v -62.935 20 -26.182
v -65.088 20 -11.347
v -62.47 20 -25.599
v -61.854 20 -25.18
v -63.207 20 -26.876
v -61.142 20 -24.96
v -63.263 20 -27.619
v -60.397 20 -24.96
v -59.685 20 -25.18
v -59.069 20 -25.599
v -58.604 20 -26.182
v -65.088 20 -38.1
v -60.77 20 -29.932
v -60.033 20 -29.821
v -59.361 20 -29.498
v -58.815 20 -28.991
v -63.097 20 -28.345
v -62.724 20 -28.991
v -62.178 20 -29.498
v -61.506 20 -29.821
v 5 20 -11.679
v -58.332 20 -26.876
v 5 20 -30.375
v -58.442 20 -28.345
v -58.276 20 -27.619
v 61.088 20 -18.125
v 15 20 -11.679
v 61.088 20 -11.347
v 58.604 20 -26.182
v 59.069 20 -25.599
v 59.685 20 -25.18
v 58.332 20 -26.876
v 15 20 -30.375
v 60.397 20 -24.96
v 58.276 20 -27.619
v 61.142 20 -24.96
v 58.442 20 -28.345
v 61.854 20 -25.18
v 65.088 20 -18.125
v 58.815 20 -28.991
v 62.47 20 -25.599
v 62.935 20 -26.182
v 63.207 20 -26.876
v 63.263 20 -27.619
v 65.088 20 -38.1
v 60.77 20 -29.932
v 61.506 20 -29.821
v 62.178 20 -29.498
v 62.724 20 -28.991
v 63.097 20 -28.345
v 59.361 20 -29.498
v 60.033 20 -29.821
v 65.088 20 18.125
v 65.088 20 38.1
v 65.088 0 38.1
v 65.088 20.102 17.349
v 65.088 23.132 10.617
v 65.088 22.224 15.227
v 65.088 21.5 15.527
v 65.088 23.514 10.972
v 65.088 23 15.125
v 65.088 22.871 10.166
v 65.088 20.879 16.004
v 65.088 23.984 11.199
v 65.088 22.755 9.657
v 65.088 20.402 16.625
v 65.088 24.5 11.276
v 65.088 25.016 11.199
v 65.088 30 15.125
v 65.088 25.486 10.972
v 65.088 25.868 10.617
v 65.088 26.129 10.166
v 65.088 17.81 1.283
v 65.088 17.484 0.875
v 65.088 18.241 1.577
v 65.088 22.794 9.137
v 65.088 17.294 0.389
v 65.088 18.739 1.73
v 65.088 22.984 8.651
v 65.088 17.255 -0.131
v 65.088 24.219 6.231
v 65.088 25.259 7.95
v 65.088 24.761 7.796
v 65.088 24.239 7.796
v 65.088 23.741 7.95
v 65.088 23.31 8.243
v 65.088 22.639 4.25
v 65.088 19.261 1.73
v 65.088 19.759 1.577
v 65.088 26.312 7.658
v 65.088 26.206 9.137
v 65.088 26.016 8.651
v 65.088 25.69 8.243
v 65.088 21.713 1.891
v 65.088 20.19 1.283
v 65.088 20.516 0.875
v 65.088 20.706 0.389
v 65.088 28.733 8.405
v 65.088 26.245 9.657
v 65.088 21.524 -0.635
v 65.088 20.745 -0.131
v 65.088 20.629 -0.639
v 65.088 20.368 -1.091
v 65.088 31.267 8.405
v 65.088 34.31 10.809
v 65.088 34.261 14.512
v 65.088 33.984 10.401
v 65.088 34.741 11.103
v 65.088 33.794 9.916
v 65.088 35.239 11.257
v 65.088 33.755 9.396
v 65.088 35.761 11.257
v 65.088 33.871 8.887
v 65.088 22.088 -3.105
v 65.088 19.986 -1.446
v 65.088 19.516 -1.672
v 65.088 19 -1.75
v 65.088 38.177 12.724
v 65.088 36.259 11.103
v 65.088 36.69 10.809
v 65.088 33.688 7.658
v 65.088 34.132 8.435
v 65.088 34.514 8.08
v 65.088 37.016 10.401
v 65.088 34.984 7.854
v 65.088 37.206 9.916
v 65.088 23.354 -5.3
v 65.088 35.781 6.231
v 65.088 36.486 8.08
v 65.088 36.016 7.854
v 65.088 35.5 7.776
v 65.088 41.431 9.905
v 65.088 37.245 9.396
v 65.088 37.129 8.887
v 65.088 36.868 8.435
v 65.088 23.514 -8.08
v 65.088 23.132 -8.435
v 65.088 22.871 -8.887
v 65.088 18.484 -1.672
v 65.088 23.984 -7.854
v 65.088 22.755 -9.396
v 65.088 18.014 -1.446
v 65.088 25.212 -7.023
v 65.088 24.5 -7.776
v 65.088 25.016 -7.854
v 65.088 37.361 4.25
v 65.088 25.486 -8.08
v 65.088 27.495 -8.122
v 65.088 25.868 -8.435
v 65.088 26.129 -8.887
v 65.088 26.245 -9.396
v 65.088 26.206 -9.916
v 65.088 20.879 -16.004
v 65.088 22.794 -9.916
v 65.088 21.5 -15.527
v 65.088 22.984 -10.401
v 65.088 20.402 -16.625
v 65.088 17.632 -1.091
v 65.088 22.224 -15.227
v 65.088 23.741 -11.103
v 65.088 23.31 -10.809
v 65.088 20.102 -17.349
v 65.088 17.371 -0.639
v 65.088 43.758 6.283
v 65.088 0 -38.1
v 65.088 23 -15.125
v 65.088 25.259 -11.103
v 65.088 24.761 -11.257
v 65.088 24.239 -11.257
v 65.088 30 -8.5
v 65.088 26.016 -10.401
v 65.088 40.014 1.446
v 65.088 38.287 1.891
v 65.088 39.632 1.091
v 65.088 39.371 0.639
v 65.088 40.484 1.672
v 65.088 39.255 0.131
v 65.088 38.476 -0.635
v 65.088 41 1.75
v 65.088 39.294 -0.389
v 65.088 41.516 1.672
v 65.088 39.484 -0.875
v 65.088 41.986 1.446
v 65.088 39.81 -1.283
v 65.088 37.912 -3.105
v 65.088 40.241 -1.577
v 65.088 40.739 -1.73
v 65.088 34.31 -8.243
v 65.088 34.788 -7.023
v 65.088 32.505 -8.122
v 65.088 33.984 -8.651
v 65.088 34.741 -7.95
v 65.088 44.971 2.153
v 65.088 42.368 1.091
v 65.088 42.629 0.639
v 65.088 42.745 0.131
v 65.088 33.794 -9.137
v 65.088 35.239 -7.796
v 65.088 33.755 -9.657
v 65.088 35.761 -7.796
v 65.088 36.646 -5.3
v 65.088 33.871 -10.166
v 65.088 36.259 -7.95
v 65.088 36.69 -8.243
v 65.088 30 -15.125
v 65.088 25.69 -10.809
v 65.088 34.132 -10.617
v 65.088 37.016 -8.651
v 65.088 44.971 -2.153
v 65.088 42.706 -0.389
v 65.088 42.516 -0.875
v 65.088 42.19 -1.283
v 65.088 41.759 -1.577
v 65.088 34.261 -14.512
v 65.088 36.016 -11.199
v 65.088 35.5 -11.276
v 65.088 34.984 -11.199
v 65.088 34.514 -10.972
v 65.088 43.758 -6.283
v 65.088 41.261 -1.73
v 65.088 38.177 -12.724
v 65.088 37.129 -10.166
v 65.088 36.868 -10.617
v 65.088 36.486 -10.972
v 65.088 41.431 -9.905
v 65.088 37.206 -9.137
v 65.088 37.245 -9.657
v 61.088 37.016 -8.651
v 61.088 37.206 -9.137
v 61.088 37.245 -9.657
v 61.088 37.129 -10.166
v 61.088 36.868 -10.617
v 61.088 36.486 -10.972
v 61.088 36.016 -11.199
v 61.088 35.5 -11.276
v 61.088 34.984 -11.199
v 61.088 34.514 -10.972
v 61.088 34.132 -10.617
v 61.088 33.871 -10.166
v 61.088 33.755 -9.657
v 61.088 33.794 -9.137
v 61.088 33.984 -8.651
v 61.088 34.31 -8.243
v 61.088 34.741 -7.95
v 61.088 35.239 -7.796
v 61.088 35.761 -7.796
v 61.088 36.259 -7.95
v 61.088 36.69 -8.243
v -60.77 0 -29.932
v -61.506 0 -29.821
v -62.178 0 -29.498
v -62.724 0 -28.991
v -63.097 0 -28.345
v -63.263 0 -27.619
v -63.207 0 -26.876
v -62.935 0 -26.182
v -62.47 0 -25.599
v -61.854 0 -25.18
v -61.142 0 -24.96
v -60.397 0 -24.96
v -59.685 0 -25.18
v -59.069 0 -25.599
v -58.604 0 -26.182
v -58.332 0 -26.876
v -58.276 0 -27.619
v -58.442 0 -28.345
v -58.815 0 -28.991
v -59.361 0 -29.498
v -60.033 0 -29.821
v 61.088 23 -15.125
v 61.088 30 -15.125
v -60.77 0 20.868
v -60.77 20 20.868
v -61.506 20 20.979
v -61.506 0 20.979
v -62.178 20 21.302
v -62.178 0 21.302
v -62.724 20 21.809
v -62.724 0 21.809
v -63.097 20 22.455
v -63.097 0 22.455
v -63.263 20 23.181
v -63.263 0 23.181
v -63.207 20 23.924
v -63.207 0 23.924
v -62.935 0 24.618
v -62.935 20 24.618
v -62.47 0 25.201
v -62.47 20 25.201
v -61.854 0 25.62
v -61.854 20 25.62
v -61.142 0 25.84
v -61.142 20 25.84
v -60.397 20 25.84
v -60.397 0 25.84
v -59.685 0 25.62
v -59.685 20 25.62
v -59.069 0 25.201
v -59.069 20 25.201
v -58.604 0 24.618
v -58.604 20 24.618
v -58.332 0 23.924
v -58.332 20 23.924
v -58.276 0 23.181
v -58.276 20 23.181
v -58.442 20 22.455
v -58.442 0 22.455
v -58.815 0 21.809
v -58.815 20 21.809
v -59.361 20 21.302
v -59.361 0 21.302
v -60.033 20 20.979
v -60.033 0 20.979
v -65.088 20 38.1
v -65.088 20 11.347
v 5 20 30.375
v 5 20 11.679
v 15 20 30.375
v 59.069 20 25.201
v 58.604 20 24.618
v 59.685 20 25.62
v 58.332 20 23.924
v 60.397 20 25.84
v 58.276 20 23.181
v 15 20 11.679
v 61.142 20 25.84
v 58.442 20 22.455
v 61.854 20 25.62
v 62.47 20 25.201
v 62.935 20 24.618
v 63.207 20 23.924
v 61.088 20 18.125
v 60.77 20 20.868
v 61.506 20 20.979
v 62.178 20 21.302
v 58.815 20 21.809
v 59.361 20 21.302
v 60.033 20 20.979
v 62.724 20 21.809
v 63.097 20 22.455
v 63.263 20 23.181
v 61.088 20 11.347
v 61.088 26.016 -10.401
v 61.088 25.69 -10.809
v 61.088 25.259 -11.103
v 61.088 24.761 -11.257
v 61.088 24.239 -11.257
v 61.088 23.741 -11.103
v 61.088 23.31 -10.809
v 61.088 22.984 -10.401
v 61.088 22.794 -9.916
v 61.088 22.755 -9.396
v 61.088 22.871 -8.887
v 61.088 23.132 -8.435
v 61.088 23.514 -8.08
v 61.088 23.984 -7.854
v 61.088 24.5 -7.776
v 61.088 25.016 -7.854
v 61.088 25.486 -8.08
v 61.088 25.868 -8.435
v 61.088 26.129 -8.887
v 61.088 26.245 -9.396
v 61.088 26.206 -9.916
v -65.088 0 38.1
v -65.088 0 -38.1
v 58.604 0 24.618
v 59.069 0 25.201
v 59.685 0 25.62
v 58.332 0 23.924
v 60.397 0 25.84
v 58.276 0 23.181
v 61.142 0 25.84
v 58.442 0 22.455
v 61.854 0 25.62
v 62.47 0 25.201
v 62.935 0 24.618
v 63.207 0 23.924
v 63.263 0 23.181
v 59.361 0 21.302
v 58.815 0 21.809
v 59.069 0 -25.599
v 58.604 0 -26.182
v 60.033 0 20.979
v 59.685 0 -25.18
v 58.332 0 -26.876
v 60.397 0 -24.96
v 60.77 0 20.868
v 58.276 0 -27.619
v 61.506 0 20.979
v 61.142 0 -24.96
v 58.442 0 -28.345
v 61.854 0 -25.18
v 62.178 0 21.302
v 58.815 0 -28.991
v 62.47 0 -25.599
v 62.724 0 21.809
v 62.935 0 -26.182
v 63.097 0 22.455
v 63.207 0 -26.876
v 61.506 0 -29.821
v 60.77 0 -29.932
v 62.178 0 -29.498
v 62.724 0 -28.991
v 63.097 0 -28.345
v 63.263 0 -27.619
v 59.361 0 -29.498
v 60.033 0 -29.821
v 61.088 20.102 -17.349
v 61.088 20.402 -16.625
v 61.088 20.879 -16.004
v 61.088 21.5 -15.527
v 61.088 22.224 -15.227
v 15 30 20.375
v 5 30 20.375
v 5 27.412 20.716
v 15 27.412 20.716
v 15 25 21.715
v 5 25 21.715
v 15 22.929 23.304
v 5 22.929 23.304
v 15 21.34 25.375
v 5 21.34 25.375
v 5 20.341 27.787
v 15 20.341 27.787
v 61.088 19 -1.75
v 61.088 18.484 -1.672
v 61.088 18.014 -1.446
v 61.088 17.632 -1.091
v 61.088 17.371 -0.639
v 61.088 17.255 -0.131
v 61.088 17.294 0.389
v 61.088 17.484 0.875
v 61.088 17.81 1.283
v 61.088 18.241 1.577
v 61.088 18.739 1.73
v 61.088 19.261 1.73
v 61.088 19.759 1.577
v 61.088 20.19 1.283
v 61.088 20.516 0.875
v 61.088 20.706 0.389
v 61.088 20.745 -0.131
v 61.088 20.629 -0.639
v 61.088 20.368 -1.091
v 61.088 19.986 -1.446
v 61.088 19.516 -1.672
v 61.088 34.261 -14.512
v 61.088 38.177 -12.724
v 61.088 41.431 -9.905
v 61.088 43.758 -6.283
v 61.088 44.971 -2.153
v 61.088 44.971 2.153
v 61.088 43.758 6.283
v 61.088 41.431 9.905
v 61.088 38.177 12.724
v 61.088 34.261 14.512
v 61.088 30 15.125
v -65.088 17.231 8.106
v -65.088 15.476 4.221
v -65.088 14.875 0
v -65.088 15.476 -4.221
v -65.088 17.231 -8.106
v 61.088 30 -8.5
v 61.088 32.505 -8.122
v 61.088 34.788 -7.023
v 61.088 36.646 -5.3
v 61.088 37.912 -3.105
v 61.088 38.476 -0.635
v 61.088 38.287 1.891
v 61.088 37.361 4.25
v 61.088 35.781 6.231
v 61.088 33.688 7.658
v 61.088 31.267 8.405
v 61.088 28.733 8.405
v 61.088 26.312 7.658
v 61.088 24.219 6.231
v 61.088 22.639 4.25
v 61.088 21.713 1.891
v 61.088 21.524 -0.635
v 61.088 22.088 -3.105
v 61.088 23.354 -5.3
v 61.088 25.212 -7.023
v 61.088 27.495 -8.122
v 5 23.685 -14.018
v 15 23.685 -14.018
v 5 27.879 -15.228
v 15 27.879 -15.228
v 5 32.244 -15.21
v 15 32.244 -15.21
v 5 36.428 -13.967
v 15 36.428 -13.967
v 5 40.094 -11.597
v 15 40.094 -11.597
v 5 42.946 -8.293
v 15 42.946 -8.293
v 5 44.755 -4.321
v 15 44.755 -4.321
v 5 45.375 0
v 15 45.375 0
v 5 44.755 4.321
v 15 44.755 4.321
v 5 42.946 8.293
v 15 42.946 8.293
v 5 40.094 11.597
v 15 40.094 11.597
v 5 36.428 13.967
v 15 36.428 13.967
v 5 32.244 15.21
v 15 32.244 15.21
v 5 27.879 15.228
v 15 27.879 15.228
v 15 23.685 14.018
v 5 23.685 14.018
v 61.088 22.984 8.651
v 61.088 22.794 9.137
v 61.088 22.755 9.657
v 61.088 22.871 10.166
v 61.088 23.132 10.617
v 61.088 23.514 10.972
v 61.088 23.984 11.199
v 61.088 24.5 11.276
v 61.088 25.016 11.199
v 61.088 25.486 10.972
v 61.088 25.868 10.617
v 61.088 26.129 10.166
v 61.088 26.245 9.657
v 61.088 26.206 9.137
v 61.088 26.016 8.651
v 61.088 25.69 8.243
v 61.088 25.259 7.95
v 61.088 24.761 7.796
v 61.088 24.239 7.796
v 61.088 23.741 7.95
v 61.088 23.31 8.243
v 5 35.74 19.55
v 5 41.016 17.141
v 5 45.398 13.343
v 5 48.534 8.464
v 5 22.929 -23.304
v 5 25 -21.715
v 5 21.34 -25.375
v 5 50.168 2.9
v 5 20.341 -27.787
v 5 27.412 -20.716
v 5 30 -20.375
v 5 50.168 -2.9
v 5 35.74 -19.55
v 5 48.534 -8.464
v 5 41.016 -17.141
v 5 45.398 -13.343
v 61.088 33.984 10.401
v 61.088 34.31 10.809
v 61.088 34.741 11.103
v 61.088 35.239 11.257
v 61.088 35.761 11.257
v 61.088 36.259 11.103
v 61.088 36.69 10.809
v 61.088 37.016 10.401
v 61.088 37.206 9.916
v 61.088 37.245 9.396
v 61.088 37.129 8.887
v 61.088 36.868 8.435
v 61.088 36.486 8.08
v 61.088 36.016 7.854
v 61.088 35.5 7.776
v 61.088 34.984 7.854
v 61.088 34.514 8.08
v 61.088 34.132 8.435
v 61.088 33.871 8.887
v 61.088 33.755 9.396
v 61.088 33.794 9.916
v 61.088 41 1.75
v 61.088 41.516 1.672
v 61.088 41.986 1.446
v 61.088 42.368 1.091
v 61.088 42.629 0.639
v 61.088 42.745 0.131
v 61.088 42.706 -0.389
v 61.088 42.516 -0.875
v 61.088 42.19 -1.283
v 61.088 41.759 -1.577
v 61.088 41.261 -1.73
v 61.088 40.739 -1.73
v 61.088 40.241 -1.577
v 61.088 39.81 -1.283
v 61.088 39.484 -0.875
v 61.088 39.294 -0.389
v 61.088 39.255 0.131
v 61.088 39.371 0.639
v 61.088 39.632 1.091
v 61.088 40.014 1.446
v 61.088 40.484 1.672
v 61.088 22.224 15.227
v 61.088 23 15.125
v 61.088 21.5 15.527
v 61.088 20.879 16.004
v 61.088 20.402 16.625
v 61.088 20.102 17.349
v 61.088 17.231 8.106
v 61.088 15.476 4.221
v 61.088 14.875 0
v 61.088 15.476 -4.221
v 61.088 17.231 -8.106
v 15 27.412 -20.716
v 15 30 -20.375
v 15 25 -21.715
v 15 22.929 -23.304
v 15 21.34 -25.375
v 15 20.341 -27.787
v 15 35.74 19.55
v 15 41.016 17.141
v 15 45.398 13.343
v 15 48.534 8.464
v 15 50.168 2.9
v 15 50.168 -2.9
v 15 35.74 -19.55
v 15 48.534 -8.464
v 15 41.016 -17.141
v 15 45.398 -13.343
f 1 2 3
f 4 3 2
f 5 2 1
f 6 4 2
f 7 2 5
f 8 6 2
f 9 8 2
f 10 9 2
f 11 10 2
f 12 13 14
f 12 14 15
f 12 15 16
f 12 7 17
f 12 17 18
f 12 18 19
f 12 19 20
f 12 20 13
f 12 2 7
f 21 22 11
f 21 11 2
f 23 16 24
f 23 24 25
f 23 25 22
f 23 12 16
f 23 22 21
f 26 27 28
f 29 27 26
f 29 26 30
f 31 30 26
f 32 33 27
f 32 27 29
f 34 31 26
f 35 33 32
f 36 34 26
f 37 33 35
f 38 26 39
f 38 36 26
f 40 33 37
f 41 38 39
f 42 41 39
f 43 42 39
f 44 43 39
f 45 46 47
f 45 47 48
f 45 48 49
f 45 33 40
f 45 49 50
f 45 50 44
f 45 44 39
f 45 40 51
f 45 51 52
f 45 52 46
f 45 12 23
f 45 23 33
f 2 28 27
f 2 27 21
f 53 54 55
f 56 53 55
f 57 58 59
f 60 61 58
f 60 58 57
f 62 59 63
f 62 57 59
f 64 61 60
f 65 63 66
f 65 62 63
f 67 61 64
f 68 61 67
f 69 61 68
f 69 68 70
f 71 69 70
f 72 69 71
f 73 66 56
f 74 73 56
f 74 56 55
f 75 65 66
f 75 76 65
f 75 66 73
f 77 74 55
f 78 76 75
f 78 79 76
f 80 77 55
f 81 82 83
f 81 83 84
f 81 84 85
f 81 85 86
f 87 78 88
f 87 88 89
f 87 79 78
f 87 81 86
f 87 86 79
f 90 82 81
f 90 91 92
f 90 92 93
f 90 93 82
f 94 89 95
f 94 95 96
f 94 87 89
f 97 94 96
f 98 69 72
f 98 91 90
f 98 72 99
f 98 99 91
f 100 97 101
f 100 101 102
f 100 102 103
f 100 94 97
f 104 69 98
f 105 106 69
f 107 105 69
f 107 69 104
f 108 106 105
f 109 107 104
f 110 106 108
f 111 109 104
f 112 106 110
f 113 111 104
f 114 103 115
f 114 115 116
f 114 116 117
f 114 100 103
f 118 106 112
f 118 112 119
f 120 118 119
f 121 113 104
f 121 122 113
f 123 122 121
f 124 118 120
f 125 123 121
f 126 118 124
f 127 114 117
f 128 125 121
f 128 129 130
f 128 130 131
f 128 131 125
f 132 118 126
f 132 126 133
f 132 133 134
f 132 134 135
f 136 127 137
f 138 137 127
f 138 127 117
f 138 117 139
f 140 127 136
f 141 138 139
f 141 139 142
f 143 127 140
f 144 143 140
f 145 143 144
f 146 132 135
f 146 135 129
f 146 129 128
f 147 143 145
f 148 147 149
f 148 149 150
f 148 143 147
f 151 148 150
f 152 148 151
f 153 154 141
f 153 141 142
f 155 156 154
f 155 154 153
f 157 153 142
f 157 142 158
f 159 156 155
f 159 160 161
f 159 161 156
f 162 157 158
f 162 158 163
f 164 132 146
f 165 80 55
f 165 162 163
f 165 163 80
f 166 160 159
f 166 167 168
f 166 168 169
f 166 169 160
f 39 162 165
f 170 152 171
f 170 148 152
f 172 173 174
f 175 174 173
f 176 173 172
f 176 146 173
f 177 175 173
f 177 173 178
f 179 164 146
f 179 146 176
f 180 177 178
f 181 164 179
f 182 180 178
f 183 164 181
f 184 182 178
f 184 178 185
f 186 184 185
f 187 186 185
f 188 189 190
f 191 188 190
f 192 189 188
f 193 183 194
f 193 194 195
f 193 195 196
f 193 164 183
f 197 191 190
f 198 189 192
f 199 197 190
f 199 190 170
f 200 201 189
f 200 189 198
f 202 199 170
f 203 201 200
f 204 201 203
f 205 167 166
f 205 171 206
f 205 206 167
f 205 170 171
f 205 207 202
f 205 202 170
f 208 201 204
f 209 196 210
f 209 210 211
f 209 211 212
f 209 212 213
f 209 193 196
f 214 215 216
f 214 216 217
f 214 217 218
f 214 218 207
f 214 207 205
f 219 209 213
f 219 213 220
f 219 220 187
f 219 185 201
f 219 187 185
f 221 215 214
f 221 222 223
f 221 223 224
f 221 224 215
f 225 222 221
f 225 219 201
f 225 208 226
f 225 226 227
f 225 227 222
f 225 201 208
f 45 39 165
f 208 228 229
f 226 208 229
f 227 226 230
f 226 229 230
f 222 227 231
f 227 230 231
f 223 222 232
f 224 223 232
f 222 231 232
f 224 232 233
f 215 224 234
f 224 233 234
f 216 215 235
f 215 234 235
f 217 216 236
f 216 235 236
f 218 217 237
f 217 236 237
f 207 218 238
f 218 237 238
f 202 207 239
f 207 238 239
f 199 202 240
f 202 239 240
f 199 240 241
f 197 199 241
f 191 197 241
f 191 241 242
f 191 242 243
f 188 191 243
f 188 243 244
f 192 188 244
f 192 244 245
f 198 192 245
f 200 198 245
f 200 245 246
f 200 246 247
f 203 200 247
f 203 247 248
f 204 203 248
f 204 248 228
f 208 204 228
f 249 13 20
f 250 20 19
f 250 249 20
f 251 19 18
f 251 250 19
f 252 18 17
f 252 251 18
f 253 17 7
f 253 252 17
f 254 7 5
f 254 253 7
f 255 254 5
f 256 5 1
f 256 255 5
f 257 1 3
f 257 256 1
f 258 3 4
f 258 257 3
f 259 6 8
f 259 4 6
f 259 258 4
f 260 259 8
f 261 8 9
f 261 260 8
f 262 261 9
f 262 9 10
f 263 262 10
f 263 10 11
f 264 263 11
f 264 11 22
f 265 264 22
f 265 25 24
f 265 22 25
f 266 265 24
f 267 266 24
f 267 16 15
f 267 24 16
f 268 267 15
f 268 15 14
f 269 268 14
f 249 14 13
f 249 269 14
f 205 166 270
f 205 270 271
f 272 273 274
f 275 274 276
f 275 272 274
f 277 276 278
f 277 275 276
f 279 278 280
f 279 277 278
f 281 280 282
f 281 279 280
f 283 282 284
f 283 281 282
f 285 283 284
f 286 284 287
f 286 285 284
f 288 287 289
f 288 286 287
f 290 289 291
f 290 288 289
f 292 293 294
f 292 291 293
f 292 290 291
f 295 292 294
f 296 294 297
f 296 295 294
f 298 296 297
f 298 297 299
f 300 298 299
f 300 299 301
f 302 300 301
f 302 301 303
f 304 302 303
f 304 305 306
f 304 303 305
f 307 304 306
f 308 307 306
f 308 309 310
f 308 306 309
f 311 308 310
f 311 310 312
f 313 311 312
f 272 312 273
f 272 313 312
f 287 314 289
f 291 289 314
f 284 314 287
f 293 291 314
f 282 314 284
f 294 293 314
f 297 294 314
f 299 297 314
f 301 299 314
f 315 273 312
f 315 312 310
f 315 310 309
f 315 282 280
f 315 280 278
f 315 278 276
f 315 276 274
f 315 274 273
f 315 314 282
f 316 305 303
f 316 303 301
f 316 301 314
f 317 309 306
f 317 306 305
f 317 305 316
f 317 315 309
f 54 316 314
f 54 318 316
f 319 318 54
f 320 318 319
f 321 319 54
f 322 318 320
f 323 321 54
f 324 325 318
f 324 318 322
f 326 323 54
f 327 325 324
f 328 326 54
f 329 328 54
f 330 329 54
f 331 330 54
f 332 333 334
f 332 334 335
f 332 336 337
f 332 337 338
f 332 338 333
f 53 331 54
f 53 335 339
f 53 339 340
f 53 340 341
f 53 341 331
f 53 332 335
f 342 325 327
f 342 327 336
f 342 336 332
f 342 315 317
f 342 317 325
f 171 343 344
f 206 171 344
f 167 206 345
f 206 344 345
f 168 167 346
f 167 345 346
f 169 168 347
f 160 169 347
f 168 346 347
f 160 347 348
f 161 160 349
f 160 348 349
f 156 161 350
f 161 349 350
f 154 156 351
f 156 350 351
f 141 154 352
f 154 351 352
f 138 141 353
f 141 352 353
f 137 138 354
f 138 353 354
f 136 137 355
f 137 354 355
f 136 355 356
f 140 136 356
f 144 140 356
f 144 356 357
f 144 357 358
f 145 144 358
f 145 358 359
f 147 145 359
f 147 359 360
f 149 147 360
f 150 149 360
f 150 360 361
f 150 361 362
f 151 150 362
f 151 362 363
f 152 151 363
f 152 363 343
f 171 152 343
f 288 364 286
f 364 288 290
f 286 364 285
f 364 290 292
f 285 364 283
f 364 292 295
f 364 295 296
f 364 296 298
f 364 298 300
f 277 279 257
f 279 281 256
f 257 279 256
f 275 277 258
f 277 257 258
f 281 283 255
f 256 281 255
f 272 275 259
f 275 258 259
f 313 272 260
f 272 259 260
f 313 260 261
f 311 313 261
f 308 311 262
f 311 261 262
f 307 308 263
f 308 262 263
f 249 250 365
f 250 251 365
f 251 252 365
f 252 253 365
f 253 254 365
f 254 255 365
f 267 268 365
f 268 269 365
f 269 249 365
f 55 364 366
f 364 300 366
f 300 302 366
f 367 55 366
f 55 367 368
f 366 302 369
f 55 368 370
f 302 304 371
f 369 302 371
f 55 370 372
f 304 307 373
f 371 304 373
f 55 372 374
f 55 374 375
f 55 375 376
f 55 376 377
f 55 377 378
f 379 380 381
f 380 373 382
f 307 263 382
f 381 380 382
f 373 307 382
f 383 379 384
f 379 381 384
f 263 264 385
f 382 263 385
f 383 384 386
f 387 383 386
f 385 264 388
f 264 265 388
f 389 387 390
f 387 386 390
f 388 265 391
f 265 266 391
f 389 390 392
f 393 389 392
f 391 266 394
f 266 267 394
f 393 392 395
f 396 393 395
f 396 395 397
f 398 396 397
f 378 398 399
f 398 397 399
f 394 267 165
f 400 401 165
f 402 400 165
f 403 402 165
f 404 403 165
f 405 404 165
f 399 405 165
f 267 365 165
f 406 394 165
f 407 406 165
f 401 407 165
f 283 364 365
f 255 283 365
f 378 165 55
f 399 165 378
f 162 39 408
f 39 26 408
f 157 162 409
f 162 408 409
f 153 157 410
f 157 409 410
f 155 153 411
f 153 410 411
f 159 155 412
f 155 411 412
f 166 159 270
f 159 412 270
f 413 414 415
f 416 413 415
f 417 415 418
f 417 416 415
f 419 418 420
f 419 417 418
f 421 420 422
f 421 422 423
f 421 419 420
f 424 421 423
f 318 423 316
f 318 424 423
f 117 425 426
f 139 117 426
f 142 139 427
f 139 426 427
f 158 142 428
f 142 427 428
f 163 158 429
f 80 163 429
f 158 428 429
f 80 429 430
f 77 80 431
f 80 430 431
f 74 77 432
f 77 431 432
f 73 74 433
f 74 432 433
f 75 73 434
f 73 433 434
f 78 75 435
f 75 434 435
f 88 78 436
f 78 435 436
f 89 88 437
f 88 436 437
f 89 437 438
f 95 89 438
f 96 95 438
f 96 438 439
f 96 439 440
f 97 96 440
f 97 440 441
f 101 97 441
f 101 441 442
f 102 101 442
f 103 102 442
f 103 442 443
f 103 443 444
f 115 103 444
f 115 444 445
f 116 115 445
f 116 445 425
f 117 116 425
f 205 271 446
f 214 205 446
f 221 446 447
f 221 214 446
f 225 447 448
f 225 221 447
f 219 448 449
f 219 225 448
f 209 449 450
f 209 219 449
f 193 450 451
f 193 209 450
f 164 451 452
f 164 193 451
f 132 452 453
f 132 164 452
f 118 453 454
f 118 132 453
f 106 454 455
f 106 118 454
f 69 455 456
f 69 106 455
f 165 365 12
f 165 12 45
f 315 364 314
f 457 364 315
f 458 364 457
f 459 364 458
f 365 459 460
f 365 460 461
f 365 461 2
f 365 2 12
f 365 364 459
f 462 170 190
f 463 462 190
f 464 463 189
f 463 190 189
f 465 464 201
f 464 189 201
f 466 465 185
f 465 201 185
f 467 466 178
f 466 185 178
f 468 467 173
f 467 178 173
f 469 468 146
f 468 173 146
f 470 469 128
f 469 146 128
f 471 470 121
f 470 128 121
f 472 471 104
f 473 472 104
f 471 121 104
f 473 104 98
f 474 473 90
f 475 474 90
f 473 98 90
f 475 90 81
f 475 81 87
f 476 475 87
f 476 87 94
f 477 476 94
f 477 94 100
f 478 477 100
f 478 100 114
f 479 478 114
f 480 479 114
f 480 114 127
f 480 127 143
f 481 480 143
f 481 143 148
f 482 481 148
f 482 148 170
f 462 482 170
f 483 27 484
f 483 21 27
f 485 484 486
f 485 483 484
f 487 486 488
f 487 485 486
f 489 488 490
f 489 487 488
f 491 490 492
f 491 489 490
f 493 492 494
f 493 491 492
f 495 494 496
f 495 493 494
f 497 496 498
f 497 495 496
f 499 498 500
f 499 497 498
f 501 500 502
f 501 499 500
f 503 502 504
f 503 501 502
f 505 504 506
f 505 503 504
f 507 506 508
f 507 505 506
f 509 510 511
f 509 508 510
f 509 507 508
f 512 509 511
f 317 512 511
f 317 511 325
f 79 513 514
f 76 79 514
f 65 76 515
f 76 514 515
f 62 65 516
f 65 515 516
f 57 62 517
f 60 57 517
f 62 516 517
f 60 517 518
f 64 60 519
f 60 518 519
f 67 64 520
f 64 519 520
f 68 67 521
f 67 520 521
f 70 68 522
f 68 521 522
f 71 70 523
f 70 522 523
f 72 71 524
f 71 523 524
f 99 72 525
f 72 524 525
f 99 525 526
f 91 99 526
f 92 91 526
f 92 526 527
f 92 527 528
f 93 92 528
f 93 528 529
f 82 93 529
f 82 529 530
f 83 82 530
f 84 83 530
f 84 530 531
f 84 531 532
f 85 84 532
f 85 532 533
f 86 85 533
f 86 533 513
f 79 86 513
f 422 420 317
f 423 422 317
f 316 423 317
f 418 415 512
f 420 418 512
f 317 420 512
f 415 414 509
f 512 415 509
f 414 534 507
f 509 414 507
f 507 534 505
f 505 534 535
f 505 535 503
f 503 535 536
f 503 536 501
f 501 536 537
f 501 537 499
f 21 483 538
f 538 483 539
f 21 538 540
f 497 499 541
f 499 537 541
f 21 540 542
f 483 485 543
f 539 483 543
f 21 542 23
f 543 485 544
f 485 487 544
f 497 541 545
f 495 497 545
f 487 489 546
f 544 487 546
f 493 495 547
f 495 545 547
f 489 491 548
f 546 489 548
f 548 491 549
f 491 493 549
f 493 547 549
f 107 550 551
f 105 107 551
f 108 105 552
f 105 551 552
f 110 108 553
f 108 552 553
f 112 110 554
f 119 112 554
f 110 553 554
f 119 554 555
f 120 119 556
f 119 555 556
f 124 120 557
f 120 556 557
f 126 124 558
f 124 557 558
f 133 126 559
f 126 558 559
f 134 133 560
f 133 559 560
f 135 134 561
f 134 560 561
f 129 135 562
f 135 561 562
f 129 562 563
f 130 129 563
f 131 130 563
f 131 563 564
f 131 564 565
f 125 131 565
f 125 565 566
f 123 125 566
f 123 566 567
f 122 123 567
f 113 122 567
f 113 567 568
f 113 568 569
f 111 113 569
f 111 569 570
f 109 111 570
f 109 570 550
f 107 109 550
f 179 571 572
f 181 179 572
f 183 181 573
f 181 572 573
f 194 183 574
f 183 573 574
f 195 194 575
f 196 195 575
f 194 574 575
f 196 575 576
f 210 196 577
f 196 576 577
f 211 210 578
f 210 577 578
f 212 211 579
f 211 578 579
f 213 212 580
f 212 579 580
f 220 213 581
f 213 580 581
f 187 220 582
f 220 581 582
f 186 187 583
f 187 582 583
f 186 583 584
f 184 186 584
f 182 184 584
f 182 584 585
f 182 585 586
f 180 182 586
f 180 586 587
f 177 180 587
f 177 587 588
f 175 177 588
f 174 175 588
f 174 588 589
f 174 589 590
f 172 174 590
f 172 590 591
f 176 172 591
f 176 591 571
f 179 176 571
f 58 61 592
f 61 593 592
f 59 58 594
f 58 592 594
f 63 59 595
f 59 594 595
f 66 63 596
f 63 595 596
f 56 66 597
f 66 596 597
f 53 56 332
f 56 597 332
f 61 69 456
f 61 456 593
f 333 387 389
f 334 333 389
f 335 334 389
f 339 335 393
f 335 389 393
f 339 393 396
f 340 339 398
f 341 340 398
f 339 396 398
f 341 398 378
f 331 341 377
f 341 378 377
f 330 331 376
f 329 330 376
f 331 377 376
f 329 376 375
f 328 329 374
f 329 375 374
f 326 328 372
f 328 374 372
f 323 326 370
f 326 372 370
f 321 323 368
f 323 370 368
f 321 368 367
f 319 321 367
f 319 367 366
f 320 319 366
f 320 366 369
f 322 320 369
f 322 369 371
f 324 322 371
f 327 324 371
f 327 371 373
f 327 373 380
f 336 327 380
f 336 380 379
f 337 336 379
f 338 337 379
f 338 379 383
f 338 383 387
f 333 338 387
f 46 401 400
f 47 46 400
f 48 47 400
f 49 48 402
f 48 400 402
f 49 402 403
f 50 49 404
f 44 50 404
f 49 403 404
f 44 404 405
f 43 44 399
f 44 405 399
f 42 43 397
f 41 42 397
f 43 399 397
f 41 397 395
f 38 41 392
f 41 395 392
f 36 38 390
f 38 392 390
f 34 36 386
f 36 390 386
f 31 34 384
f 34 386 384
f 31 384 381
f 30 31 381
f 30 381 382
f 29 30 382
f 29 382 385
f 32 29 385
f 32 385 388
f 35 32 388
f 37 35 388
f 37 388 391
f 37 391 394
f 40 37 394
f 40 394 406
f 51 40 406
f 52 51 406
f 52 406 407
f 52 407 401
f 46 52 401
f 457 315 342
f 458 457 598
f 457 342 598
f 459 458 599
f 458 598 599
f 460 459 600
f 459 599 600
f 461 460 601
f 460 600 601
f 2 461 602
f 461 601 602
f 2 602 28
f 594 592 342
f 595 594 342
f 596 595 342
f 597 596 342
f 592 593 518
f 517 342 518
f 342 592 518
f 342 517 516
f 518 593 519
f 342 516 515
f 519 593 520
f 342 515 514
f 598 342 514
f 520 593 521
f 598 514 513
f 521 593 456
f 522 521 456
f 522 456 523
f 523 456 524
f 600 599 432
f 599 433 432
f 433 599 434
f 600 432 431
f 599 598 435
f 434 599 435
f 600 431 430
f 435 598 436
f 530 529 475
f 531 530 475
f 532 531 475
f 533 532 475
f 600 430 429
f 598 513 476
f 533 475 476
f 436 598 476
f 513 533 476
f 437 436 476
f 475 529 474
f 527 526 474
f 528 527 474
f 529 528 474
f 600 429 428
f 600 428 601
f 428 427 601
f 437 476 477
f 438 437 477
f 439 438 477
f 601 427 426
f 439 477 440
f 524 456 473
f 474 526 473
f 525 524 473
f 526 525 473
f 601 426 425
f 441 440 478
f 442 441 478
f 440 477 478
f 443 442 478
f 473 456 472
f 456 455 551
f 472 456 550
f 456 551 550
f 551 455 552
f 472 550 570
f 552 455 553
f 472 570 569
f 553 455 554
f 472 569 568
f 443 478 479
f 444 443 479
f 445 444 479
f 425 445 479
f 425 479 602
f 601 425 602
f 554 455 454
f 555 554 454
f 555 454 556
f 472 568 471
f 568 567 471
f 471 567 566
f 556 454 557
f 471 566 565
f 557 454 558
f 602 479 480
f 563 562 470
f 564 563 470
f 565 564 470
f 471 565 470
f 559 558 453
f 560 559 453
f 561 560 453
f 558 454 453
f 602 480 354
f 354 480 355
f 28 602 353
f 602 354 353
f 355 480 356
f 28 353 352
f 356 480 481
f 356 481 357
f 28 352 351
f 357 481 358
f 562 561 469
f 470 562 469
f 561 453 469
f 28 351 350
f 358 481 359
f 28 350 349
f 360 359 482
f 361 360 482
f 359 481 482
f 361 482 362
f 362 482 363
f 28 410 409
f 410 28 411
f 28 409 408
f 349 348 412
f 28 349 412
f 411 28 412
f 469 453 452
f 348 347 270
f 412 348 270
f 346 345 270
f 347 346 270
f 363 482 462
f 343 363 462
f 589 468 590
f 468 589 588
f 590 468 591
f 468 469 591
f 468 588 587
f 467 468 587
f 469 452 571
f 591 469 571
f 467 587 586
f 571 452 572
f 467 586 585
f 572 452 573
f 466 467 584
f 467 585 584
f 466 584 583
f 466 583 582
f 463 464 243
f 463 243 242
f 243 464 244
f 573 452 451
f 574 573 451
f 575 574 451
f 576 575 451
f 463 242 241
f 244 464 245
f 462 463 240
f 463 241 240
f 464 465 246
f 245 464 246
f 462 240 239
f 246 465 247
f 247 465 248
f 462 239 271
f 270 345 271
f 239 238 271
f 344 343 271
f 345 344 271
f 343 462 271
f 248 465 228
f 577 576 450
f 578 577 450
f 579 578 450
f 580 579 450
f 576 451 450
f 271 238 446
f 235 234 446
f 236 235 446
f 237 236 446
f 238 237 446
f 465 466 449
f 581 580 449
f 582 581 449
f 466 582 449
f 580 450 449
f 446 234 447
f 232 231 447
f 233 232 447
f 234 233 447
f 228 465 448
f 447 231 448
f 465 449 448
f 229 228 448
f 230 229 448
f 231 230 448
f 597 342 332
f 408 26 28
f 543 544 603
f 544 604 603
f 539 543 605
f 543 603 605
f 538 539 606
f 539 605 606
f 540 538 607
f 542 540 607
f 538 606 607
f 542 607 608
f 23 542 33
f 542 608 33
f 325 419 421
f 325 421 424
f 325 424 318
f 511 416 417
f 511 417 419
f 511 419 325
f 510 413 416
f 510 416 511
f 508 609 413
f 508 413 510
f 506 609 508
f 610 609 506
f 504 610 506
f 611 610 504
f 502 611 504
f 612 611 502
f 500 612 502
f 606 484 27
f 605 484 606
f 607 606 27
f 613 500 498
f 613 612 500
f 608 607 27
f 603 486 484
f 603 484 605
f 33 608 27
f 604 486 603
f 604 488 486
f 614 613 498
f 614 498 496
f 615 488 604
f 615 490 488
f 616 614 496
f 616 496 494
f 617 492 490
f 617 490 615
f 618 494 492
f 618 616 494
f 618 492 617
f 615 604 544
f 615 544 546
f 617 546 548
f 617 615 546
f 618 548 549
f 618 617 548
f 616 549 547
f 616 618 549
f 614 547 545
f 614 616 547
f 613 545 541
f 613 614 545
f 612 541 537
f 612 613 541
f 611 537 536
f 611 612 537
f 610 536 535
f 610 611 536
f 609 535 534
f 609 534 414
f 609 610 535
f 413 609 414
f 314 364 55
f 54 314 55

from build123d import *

# Parameters (mm, degrees)
SKETCH1_W           = 130.175
SKETCH1_H           = 76.2
BOSS_EXTRUDE1_DEPTH = 20
SKETCH2_R           = 15.125
CUT_EXTRUDE1_DEPTH  = 138.102664544
SKETCH3_R           = 15.125
BOSS_EXTRUDE2_DEPTH = 4
SKETCH4_R           = 1.75
CUT_EXTRUDE2_DEPTH  = 140.31262057
CIRPATTERN1_COUNT   = 6
SKETCH5_R           = 8.5
CUT_EXTRUDE3_DEPTH  = 143.945466
SKETCH6_R           = 2.5
CUT_EXTRUDE4_DEPTH  = 88.887759564
SKETCH8_R           = 20.375
SKETCH8_R_2         = 15.375
BOSS_EXTRUDE3_DEPTH = 5
BOSS_EXTRUDE4_DEPTH = 4
BOSS_EXTRUDE5_START = -5
BOSS_EXTRUDE5_DEPTH = 10
FILLET1_R           = 10
FILLET2_R           = 3


with BuildPart() as part:
    # Sketch1 → Boss-Extrude1 (new body)
    with BuildSketch(Plane(origin=(0, 0, 0), x_dir=(1, 0, 0), z_dir=(0, 1, 0))):
        Rectangle(SKETCH1_W, SKETCH1_H)
    extrude(amount=BOSS_EXTRUDE1_DEPTH)

    # Sketch2 → Cut-Extrude1 (cut, through all)
    with BuildSketch(Plane(origin=(65.0875, 0, 0), x_dir=(0, 0, -1), z_dir=(1, 0, 0))):
        with Locations((0, 30)):
            Circle(SKETCH2_R)
    extrude(amount=-CUT_EXTRUDE1_DEPTH, mode=Mode.SUBTRACT)

    # Sketch3 → Boss-Extrude2 (add)
    with BuildSketch(Plane(origin=(65.0875, 0, 0), x_dir=(0, 0, -1), z_dir=(1, 0, 0))):
        with Locations((0, 30)):
            Circle(SKETCH3_R)
    extrude(amount=-BOSS_EXTRUDE2_DEPTH)

    # Sketch4 → Cut-Extrude2 (cut, through all)
    with BuildSketch(Plane.ZY.offset(-61.0875)):
        with Locations((0, 41)):
            Circle(SKETCH4_R)
    cut_extrude2 = extrude(amount=-CUT_EXTRUDE2_DEPTH, mode=Mode.SUBTRACT)

    # CirPattern1: Cut-Extrude2 ×6 about axis
    cirpattern1_axis = Axis((0, 30, 0), (1, 0, 0))
    for i in range(1, CIRPATTERN1_COUNT):
        add(cut_extrude2.rotate(cirpattern1_axis, i * 360 / CIRPATTERN1_COUNT), mode=Mode.SUBTRACT)

    # Sketch5 → Cut-Extrude3 (cut, through all)
    with BuildSketch(Plane(origin=(65.0875, 0, 0), x_dir=(0, 0, -1), z_dir=(1, 0, 0))):
        with Locations((0, 30)):
            Circle(SKETCH5_R)
    extrude(amount=-CUT_EXTRUDE3_DEPTH, mode=Mode.SUBTRACT)

    # Sketch6 → Cut-Extrude4 (cut, through all)
    with BuildSketch(Plane.XZ):
        with Locations(Location((60.7695, 23.368, 0), (0, 0, 270))):
            Circle(SKETCH6_R)
        with Locations(Location((60.7695, -27.432, 0), (0, 0, 270))):
            Circle(SKETCH6_R)
    cut_extrude4 = extrude(amount=-CUT_EXTRUDE4_DEPTH, mode=Mode.SUBTRACT)

    # Mirror1: Cut-Extrude4 across plane
    add(cut_extrude4.mirror(Plane(origin=(0, 0, 0), x_dir=(0, 0, 1), z_dir=(1, 0, 0))), mode=Mode.SUBTRACT)

    # Sketch8 → Boss-Extrude3 (add, symmetric)
    with BuildSketch(Plane(origin=(10, 0, 0), x_dir=(0, 0, -1), z_dir=(1, 0, 0))):
        with Locations((0, 30)):
            Circle(SKETCH8_R)
        with Locations((0, 30)):
            Circle(SKETCH8_R_2, mode=Mode.SUBTRACT)
    extrude(amount=BOSS_EXTRUDE3_DEPTH, both=True)

    # Sketch9 → Boss-Extrude4 (add)
    with BuildSketch(Plane(origin=(65.0875, 0, 0), x_dir=(0, 0, -1), z_dir=(1, 0, 0))):
        with BuildLine():
            ThreePointArc((-11.347494217, 20), (-14.149142642, 24.655153184), (-15.125, 30))
            Line((-15.125, 30), (-15.125, 20))
            Line((-15.125, 20), (-11.347494217, 20))
        make_face()
        with BuildLine():
            Line((15.125, 20), (15.125, 30))
            ThreePointArc((15.125, 30), (14.149142642, 24.655153184), (11.347494217, 20))
            Line((11.347494217, 20), (15.125, 20))
        make_face()
    extrude(amount=-BOSS_EXTRUDE4_DEPTH)

    # Sketch10 → Boss-Extrude5 (add)
    with BuildSketch(Plane(origin=(10, 0, 0), x_dir=(0, 0, -1), z_dir=(1, 0, 0)).offset(BOSS_EXTRUDE5_START)):
        with BuildLine():
            ThreePointArc((-17.752200568, 20), (-19.708395566, 24.83088313), (-20.375, 30))
            Line((-20.375, 30), (-20.375, 20))
            Line((-20.375, 20), (-17.752200568, 20))
        make_face()
        with BuildLine():
            Line((20.375, 20), (20.375, 30))
            ThreePointArc((20.375, 30), (19.708395566, 24.83088313), (17.752200568, 20))
            Line((17.752200568, 20), (20.375, 20))
        make_face()
    extrude(amount=BOSS_EXTRUDE5_DEPTH)

    # Fillet1
    fillet1_edges = [part.edges().sort_by_distance(p)[0] for p in [
        (10, 20, -20.375),
        (10, 20, 20.375),
    ]]
    fillet(fillet1_edges, radius=FILLET1_R - 0.0001)  # a hair under: the kernel refuses the full size

    # Fillet2
    fillet2_edges = [part.edges().sort_by_distance(p)[0] for p in [
        (63.0875, 20, 15.125),
        (63.0875, 20, -15.125),
    ]]
    fillet(fillet2_edges, radius=FILLET2_R)


solid = part.part
